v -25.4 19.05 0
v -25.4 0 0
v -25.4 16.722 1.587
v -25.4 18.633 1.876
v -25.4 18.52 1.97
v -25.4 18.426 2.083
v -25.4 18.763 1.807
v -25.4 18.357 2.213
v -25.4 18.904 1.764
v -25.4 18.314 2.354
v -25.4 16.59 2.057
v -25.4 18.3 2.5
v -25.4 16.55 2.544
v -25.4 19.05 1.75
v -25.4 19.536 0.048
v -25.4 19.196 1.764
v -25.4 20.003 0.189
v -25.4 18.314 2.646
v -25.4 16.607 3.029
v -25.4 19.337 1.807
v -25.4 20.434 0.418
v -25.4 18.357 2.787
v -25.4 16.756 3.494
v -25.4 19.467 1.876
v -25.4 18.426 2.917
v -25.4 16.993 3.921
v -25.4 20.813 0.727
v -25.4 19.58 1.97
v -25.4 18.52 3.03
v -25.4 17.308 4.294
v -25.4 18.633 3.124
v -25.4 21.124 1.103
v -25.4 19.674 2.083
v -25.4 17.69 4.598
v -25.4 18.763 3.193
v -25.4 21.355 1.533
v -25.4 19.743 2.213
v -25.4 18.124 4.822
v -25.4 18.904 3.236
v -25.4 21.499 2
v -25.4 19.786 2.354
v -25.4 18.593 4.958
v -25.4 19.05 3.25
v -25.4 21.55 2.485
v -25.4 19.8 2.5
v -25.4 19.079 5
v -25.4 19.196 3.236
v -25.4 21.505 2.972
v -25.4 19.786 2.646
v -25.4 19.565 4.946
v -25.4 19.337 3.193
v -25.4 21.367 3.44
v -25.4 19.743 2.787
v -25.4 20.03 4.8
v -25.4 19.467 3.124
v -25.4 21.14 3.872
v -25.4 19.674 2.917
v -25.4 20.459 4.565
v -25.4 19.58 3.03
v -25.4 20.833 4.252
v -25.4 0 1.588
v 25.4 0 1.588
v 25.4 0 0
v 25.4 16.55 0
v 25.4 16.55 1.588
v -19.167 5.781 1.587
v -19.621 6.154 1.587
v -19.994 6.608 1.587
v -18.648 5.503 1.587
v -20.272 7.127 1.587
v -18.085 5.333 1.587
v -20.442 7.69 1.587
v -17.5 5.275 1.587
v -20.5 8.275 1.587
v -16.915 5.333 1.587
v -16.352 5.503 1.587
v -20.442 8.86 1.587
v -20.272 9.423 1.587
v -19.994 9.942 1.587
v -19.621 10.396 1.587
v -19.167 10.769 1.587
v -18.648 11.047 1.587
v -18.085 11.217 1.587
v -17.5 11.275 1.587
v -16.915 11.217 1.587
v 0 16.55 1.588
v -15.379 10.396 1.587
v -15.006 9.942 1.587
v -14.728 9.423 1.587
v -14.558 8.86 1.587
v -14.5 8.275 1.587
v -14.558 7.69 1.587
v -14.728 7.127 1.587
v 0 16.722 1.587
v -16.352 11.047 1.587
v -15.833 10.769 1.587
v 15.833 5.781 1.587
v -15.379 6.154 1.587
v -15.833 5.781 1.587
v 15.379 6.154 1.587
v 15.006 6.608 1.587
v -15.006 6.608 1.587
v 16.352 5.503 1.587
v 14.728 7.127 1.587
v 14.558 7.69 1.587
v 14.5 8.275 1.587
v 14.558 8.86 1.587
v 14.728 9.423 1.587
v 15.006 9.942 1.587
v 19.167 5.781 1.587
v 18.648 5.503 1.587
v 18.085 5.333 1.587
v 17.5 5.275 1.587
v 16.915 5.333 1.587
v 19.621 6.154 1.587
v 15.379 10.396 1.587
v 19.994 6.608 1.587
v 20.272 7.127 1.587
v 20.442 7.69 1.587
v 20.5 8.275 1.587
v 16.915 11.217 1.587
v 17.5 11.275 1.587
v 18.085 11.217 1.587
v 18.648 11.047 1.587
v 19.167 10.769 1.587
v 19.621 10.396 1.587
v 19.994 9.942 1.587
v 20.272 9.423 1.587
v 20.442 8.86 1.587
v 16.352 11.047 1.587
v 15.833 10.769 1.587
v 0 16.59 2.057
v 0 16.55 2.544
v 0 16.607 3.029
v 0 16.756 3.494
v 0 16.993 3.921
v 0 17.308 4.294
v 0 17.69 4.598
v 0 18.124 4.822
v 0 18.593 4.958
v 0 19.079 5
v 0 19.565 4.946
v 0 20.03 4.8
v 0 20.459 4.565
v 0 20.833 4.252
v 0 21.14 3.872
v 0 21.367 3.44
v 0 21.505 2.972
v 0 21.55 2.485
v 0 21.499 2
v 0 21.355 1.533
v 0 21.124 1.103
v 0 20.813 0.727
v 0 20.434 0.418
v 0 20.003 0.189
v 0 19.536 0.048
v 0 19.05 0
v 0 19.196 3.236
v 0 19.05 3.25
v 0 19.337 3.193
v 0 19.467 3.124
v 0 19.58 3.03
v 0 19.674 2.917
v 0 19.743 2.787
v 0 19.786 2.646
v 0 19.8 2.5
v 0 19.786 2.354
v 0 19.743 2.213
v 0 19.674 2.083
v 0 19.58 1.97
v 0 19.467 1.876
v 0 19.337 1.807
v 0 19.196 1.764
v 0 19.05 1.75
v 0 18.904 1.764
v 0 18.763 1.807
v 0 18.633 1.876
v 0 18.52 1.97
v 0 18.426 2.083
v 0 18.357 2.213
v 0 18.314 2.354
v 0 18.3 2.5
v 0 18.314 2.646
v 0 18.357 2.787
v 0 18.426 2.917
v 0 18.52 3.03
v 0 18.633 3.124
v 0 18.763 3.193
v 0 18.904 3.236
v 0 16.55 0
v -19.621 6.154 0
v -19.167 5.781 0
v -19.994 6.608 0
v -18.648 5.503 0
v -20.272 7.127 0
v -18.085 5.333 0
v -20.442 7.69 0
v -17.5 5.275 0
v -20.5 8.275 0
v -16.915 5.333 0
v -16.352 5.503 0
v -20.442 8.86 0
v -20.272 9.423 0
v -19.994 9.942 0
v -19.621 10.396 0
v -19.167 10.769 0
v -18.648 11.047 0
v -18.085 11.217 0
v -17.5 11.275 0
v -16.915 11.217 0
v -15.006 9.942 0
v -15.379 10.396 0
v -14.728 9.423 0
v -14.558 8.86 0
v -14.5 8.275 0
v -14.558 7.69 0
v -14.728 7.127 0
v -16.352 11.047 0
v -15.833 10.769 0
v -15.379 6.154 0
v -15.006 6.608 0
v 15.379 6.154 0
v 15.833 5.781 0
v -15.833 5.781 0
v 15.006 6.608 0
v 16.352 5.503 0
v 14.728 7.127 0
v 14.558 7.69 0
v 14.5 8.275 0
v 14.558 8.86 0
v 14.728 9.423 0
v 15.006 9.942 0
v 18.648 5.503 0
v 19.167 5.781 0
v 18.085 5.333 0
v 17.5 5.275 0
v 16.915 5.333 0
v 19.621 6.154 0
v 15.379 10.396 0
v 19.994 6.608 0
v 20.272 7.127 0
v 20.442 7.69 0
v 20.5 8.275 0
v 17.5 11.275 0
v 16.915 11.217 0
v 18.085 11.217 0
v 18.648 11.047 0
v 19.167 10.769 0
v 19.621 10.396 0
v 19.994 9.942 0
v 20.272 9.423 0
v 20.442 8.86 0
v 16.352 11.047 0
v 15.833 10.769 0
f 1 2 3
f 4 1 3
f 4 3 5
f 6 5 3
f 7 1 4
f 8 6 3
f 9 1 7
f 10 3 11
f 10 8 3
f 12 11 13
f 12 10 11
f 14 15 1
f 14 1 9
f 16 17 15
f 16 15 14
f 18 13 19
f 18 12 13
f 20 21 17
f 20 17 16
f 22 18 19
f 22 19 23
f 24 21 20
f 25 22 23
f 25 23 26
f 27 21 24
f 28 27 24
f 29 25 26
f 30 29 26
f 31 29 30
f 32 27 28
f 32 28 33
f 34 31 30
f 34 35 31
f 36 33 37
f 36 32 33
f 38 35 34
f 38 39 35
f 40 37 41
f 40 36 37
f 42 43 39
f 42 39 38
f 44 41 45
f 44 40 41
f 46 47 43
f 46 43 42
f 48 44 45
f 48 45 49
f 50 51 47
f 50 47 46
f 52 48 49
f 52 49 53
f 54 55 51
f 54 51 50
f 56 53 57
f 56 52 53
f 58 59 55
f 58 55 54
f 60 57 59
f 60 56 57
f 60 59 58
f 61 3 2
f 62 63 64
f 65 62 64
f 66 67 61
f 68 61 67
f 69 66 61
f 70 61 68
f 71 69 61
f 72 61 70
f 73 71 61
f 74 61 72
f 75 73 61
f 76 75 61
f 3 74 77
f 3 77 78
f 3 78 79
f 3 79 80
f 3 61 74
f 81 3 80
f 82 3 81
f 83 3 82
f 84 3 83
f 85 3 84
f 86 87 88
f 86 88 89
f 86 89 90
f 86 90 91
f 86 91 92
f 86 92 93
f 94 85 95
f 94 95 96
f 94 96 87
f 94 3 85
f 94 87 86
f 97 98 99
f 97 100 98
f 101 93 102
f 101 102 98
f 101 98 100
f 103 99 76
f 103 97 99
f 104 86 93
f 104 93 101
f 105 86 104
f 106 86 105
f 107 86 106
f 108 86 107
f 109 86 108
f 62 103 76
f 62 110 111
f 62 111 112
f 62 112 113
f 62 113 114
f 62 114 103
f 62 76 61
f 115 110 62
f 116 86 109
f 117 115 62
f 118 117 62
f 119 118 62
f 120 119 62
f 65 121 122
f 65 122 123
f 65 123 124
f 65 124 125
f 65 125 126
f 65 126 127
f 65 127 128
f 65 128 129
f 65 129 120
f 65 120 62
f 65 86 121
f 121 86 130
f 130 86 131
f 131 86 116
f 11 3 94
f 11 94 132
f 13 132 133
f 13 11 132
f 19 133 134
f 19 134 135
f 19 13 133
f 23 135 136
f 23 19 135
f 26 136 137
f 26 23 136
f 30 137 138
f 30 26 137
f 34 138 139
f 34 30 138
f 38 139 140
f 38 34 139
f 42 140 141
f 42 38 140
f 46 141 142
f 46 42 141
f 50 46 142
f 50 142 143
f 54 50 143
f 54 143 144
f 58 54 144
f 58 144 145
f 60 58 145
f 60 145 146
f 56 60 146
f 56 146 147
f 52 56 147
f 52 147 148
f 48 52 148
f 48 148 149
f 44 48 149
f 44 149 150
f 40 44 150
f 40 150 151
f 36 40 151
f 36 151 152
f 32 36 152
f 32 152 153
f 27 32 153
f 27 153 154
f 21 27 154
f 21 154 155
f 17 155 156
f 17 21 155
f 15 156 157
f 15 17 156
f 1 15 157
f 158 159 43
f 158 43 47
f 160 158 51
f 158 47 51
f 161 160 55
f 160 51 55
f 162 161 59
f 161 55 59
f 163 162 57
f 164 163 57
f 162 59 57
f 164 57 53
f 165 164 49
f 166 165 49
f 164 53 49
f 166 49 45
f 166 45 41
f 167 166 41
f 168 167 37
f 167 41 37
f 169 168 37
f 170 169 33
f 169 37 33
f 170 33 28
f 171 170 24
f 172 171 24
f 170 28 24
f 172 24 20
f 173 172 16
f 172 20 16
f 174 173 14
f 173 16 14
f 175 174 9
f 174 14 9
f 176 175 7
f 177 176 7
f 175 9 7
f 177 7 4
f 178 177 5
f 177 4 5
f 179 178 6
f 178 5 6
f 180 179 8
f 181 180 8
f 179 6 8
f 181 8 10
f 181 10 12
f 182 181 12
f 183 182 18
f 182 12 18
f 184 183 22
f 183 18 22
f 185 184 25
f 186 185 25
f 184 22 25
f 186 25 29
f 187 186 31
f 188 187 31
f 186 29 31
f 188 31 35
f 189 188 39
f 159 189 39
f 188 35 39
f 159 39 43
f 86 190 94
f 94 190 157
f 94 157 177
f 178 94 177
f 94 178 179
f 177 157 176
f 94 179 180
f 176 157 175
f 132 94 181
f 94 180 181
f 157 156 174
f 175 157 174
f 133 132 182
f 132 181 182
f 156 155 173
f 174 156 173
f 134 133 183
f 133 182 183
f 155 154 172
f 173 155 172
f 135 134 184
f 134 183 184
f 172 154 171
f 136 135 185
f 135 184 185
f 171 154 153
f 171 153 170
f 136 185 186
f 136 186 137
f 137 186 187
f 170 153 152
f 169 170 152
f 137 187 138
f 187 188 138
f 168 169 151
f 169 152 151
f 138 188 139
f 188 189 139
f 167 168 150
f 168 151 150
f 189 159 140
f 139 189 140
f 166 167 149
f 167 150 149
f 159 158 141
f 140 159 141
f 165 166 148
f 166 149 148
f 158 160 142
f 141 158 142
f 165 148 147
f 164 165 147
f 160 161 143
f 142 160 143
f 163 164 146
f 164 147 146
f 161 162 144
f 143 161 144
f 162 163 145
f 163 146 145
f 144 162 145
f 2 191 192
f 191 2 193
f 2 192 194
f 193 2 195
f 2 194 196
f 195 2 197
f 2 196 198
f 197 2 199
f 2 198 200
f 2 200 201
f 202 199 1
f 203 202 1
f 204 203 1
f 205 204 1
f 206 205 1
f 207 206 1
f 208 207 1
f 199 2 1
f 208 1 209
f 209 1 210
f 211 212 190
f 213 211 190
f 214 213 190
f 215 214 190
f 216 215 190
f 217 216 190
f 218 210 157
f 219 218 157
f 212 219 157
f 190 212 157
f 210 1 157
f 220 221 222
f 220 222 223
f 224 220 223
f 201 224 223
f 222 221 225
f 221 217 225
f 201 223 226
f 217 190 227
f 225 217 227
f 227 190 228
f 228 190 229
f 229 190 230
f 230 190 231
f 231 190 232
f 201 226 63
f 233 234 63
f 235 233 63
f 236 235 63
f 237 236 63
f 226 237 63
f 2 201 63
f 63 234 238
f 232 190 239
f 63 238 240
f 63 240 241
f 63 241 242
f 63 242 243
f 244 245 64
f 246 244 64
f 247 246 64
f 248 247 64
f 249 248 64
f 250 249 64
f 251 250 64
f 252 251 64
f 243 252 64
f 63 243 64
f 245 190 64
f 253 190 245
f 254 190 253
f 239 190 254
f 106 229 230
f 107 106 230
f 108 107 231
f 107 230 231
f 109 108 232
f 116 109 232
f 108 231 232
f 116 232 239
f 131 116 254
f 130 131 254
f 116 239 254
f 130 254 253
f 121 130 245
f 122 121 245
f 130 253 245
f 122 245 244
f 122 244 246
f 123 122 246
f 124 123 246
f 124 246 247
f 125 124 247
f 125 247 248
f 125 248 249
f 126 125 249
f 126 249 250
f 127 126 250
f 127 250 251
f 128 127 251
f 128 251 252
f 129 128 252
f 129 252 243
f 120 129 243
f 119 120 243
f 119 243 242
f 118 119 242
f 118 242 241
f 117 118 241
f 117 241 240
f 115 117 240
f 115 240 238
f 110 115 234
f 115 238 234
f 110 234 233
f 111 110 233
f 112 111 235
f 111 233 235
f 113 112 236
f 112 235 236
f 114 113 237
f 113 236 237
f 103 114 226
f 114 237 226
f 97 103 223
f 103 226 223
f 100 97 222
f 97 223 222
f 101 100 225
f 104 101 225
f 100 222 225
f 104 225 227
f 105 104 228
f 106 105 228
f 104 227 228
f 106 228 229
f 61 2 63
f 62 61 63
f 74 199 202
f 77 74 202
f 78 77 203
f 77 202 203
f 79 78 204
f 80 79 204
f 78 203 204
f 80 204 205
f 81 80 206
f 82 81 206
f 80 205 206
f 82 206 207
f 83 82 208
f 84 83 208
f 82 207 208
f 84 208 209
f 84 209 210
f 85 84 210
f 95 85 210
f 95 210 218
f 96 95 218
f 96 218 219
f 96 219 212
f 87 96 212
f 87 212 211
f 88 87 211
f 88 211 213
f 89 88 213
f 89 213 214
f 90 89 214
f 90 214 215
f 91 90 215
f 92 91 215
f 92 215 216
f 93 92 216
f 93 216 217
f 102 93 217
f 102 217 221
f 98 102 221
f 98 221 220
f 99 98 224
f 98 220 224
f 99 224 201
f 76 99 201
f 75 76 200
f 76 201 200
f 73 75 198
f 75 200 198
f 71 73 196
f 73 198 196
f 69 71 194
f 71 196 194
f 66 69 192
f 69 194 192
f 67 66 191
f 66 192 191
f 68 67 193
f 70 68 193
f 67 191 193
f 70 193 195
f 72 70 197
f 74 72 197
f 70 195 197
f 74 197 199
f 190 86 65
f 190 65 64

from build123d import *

# Parameters (mm, degrees)
SKETCH1_W                   = 50.8
SKETCH1_H                   = 19.05
BOSS_EXTRUDE1_DEPTH         = 1.5875
SKETCH2_R                   = 2.5
SKETCH2_R_2                 = 0.75
BOSS_EXTRUDE2_DEPTH         = 25.4
CUT_EXTRUDE2_DEPTH          = 25.4
F_6_0_MM_DOWEL_HOLES1_D     = 6
F_6_0_MM_DOWEL_HOLES1_DEPTH = 30
F_6_0_MM_DOWEL_HOLES1_TIP   = 1.802581857


with BuildPart() as part:
    # Sketch1 → Boss-Extrude1 (new body)
    with BuildSketch(Plane.XY):
        with Locations((0, 9.525)):
            Rectangle(SKETCH1_W, SKETCH1_H)
    extrude(amount=BOSS_EXTRUDE1_DEPTH)

    # Sketch2 → Boss-Extrude2 (add)
    with BuildSketch(Plane.ZY.offset(25.4)):
        with Locations((2.5, 19.05)):
            Circle(SKETCH2_R)
        with Locations((2.5, 19.05)):
            Circle(SKETCH2_R_2, mode=Mode.SUBTRACT)
    extrude(amount=-BOSS_EXTRUDE2_DEPTH)

    # Sketch3 → Cut-Extrude2 (cut)
    with BuildSketch(Plane(origin=(0, 0, 0), x_dir=(0, 0, -1), z_dir=(1, 0, 0))):
        with BuildLine():
            Line((-2.5, 16.55), (0, 16.55))
            Line((0, 16.55), (0, 19.05))
            ThreePointArc((0, 19.05), (-4.267766953, 20.817766953), (-2.5, 16.55))
        make_face()
    extrude(amount=CUT_EXTRUDE2_DEPTH, mode=Mode.SUBTRACT)

    # Ø6.0 mm Dowel Holes1
    with Locations(Plane.XY.offset(1.5875)):
        with Locations((-17.5, 8.275), (17.5, 8.275)):
            Hole(F_6_0_MM_DOWEL_HOLES1_D / 2, depth=F_6_0_MM_DOWEL_HOLES1_DEPTH)
            with Locations((0, 0, -(F_6_0_MM_DOWEL_HOLES1_DEPTH + F_6_0_MM_DOWEL_HOLES1_TIP / 2))):  # 118° drill point
                Cone(0, F_6_0_MM_DOWEL_HOLES1_D / 2, F_6_0_MM_DOWEL_HOLES1_TIP, mode=Mode.SUBTRACT)


solid = part.part
